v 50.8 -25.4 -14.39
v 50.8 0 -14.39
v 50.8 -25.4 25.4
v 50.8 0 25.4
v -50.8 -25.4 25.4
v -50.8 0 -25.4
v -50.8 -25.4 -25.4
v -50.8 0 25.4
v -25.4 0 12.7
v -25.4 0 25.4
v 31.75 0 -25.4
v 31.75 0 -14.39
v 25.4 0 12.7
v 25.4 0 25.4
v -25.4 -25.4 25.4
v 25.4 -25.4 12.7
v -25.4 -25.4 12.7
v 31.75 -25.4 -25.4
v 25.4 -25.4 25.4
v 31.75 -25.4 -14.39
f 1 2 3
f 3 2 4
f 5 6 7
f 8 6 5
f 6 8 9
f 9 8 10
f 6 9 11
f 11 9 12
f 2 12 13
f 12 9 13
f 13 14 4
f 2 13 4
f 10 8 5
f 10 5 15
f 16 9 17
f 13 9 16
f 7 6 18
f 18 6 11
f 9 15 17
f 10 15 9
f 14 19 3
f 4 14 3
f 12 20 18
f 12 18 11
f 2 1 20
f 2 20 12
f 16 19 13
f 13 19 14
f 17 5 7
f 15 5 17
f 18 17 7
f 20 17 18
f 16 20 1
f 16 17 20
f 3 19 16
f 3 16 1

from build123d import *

# Parameters (mm, degrees)
F0_W     = 101.6
F0_H     = 50.8
F1_DEPTH = 25.4
F2_W     = 50.8
F2_H     = 25.4
F3_DEPTH = 12.7
F4_W     = 25.4
F4_H     = 11.0103109196
F5_DEPTH = 19.05


with BuildPart() as f1:
    # F0 (on Front) → F1 (new body)
    with BuildSketch(Plane.XZ):
        Rectangle(F0_W, F0_H)
    extrude(amount=F1_DEPTH)

    # F2 (on face) → F3 (cut)
    with BuildSketch(Plane.XY.offset(25.4)):
        with Locations((0, -12.7)):
            Rectangle(F2_W, F2_H)
    extrude(amount=-F3_DEPTH, mode=Mode.SUBTRACT)

    # F4 (on face) → F5 (cut)
    with BuildSketch(Plane.YZ.offset(50.8)):
        with Locations((-12.7, -19.8948445402)):
            Rectangle(F4_W, F4_H)
    extrude(amount=-F5_DEPTH, mode=Mode.SUBTRACT)


solid = f1.part
